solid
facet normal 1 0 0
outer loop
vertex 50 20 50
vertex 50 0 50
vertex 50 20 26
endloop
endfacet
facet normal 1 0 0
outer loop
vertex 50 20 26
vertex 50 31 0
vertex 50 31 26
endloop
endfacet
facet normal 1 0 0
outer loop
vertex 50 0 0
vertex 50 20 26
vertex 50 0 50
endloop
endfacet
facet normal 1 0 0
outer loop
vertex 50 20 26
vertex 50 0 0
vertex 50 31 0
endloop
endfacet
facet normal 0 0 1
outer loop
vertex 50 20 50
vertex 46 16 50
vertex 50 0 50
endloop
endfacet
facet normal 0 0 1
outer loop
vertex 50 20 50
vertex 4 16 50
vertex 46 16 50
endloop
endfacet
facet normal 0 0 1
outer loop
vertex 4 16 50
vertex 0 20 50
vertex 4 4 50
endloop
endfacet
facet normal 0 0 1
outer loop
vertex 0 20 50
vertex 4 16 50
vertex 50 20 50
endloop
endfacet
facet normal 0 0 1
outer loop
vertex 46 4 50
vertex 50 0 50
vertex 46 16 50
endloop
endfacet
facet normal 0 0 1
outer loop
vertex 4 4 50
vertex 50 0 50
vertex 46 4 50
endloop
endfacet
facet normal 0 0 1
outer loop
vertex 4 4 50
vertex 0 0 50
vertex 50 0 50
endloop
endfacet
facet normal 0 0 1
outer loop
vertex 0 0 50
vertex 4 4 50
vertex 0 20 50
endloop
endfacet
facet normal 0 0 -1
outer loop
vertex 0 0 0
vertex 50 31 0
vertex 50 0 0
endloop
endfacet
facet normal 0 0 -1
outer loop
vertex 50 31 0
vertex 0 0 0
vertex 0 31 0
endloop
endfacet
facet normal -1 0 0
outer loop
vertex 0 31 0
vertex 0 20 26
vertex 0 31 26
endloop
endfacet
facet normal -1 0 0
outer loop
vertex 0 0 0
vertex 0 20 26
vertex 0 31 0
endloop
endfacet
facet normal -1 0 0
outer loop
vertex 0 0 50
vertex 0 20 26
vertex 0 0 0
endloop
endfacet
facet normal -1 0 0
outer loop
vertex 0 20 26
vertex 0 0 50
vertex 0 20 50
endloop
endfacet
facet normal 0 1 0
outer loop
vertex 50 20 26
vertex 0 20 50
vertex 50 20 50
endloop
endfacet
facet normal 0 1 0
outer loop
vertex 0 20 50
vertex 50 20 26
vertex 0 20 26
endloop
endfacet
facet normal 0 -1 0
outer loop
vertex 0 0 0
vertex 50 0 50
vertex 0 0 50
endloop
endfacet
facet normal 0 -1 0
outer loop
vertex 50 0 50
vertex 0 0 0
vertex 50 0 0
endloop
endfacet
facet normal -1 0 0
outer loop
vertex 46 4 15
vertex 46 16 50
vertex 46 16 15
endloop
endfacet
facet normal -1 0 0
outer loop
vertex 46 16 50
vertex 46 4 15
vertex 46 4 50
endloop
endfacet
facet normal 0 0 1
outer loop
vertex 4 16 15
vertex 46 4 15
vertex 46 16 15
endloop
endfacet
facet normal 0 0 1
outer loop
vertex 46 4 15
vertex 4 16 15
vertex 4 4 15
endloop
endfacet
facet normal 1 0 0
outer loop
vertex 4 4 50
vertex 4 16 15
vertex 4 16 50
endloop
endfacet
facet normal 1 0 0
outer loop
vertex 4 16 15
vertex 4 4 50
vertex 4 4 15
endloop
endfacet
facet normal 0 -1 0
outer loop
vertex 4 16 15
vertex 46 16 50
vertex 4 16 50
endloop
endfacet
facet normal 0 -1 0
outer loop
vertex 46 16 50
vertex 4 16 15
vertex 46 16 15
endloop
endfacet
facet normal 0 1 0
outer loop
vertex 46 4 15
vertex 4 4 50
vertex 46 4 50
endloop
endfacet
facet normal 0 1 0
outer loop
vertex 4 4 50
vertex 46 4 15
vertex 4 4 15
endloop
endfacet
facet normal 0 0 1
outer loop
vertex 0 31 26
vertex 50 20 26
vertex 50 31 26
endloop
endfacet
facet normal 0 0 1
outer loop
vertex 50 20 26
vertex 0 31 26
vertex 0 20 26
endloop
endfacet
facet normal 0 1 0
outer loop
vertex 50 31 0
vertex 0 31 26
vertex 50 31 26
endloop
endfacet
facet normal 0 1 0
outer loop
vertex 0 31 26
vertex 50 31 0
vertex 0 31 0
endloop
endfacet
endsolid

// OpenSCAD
difference()
{
  cube([50,20,50]);
  translate([4,4,15]) cube([42,12,40]);
}
translate([0,20,0]) cube([50,11,26]);
